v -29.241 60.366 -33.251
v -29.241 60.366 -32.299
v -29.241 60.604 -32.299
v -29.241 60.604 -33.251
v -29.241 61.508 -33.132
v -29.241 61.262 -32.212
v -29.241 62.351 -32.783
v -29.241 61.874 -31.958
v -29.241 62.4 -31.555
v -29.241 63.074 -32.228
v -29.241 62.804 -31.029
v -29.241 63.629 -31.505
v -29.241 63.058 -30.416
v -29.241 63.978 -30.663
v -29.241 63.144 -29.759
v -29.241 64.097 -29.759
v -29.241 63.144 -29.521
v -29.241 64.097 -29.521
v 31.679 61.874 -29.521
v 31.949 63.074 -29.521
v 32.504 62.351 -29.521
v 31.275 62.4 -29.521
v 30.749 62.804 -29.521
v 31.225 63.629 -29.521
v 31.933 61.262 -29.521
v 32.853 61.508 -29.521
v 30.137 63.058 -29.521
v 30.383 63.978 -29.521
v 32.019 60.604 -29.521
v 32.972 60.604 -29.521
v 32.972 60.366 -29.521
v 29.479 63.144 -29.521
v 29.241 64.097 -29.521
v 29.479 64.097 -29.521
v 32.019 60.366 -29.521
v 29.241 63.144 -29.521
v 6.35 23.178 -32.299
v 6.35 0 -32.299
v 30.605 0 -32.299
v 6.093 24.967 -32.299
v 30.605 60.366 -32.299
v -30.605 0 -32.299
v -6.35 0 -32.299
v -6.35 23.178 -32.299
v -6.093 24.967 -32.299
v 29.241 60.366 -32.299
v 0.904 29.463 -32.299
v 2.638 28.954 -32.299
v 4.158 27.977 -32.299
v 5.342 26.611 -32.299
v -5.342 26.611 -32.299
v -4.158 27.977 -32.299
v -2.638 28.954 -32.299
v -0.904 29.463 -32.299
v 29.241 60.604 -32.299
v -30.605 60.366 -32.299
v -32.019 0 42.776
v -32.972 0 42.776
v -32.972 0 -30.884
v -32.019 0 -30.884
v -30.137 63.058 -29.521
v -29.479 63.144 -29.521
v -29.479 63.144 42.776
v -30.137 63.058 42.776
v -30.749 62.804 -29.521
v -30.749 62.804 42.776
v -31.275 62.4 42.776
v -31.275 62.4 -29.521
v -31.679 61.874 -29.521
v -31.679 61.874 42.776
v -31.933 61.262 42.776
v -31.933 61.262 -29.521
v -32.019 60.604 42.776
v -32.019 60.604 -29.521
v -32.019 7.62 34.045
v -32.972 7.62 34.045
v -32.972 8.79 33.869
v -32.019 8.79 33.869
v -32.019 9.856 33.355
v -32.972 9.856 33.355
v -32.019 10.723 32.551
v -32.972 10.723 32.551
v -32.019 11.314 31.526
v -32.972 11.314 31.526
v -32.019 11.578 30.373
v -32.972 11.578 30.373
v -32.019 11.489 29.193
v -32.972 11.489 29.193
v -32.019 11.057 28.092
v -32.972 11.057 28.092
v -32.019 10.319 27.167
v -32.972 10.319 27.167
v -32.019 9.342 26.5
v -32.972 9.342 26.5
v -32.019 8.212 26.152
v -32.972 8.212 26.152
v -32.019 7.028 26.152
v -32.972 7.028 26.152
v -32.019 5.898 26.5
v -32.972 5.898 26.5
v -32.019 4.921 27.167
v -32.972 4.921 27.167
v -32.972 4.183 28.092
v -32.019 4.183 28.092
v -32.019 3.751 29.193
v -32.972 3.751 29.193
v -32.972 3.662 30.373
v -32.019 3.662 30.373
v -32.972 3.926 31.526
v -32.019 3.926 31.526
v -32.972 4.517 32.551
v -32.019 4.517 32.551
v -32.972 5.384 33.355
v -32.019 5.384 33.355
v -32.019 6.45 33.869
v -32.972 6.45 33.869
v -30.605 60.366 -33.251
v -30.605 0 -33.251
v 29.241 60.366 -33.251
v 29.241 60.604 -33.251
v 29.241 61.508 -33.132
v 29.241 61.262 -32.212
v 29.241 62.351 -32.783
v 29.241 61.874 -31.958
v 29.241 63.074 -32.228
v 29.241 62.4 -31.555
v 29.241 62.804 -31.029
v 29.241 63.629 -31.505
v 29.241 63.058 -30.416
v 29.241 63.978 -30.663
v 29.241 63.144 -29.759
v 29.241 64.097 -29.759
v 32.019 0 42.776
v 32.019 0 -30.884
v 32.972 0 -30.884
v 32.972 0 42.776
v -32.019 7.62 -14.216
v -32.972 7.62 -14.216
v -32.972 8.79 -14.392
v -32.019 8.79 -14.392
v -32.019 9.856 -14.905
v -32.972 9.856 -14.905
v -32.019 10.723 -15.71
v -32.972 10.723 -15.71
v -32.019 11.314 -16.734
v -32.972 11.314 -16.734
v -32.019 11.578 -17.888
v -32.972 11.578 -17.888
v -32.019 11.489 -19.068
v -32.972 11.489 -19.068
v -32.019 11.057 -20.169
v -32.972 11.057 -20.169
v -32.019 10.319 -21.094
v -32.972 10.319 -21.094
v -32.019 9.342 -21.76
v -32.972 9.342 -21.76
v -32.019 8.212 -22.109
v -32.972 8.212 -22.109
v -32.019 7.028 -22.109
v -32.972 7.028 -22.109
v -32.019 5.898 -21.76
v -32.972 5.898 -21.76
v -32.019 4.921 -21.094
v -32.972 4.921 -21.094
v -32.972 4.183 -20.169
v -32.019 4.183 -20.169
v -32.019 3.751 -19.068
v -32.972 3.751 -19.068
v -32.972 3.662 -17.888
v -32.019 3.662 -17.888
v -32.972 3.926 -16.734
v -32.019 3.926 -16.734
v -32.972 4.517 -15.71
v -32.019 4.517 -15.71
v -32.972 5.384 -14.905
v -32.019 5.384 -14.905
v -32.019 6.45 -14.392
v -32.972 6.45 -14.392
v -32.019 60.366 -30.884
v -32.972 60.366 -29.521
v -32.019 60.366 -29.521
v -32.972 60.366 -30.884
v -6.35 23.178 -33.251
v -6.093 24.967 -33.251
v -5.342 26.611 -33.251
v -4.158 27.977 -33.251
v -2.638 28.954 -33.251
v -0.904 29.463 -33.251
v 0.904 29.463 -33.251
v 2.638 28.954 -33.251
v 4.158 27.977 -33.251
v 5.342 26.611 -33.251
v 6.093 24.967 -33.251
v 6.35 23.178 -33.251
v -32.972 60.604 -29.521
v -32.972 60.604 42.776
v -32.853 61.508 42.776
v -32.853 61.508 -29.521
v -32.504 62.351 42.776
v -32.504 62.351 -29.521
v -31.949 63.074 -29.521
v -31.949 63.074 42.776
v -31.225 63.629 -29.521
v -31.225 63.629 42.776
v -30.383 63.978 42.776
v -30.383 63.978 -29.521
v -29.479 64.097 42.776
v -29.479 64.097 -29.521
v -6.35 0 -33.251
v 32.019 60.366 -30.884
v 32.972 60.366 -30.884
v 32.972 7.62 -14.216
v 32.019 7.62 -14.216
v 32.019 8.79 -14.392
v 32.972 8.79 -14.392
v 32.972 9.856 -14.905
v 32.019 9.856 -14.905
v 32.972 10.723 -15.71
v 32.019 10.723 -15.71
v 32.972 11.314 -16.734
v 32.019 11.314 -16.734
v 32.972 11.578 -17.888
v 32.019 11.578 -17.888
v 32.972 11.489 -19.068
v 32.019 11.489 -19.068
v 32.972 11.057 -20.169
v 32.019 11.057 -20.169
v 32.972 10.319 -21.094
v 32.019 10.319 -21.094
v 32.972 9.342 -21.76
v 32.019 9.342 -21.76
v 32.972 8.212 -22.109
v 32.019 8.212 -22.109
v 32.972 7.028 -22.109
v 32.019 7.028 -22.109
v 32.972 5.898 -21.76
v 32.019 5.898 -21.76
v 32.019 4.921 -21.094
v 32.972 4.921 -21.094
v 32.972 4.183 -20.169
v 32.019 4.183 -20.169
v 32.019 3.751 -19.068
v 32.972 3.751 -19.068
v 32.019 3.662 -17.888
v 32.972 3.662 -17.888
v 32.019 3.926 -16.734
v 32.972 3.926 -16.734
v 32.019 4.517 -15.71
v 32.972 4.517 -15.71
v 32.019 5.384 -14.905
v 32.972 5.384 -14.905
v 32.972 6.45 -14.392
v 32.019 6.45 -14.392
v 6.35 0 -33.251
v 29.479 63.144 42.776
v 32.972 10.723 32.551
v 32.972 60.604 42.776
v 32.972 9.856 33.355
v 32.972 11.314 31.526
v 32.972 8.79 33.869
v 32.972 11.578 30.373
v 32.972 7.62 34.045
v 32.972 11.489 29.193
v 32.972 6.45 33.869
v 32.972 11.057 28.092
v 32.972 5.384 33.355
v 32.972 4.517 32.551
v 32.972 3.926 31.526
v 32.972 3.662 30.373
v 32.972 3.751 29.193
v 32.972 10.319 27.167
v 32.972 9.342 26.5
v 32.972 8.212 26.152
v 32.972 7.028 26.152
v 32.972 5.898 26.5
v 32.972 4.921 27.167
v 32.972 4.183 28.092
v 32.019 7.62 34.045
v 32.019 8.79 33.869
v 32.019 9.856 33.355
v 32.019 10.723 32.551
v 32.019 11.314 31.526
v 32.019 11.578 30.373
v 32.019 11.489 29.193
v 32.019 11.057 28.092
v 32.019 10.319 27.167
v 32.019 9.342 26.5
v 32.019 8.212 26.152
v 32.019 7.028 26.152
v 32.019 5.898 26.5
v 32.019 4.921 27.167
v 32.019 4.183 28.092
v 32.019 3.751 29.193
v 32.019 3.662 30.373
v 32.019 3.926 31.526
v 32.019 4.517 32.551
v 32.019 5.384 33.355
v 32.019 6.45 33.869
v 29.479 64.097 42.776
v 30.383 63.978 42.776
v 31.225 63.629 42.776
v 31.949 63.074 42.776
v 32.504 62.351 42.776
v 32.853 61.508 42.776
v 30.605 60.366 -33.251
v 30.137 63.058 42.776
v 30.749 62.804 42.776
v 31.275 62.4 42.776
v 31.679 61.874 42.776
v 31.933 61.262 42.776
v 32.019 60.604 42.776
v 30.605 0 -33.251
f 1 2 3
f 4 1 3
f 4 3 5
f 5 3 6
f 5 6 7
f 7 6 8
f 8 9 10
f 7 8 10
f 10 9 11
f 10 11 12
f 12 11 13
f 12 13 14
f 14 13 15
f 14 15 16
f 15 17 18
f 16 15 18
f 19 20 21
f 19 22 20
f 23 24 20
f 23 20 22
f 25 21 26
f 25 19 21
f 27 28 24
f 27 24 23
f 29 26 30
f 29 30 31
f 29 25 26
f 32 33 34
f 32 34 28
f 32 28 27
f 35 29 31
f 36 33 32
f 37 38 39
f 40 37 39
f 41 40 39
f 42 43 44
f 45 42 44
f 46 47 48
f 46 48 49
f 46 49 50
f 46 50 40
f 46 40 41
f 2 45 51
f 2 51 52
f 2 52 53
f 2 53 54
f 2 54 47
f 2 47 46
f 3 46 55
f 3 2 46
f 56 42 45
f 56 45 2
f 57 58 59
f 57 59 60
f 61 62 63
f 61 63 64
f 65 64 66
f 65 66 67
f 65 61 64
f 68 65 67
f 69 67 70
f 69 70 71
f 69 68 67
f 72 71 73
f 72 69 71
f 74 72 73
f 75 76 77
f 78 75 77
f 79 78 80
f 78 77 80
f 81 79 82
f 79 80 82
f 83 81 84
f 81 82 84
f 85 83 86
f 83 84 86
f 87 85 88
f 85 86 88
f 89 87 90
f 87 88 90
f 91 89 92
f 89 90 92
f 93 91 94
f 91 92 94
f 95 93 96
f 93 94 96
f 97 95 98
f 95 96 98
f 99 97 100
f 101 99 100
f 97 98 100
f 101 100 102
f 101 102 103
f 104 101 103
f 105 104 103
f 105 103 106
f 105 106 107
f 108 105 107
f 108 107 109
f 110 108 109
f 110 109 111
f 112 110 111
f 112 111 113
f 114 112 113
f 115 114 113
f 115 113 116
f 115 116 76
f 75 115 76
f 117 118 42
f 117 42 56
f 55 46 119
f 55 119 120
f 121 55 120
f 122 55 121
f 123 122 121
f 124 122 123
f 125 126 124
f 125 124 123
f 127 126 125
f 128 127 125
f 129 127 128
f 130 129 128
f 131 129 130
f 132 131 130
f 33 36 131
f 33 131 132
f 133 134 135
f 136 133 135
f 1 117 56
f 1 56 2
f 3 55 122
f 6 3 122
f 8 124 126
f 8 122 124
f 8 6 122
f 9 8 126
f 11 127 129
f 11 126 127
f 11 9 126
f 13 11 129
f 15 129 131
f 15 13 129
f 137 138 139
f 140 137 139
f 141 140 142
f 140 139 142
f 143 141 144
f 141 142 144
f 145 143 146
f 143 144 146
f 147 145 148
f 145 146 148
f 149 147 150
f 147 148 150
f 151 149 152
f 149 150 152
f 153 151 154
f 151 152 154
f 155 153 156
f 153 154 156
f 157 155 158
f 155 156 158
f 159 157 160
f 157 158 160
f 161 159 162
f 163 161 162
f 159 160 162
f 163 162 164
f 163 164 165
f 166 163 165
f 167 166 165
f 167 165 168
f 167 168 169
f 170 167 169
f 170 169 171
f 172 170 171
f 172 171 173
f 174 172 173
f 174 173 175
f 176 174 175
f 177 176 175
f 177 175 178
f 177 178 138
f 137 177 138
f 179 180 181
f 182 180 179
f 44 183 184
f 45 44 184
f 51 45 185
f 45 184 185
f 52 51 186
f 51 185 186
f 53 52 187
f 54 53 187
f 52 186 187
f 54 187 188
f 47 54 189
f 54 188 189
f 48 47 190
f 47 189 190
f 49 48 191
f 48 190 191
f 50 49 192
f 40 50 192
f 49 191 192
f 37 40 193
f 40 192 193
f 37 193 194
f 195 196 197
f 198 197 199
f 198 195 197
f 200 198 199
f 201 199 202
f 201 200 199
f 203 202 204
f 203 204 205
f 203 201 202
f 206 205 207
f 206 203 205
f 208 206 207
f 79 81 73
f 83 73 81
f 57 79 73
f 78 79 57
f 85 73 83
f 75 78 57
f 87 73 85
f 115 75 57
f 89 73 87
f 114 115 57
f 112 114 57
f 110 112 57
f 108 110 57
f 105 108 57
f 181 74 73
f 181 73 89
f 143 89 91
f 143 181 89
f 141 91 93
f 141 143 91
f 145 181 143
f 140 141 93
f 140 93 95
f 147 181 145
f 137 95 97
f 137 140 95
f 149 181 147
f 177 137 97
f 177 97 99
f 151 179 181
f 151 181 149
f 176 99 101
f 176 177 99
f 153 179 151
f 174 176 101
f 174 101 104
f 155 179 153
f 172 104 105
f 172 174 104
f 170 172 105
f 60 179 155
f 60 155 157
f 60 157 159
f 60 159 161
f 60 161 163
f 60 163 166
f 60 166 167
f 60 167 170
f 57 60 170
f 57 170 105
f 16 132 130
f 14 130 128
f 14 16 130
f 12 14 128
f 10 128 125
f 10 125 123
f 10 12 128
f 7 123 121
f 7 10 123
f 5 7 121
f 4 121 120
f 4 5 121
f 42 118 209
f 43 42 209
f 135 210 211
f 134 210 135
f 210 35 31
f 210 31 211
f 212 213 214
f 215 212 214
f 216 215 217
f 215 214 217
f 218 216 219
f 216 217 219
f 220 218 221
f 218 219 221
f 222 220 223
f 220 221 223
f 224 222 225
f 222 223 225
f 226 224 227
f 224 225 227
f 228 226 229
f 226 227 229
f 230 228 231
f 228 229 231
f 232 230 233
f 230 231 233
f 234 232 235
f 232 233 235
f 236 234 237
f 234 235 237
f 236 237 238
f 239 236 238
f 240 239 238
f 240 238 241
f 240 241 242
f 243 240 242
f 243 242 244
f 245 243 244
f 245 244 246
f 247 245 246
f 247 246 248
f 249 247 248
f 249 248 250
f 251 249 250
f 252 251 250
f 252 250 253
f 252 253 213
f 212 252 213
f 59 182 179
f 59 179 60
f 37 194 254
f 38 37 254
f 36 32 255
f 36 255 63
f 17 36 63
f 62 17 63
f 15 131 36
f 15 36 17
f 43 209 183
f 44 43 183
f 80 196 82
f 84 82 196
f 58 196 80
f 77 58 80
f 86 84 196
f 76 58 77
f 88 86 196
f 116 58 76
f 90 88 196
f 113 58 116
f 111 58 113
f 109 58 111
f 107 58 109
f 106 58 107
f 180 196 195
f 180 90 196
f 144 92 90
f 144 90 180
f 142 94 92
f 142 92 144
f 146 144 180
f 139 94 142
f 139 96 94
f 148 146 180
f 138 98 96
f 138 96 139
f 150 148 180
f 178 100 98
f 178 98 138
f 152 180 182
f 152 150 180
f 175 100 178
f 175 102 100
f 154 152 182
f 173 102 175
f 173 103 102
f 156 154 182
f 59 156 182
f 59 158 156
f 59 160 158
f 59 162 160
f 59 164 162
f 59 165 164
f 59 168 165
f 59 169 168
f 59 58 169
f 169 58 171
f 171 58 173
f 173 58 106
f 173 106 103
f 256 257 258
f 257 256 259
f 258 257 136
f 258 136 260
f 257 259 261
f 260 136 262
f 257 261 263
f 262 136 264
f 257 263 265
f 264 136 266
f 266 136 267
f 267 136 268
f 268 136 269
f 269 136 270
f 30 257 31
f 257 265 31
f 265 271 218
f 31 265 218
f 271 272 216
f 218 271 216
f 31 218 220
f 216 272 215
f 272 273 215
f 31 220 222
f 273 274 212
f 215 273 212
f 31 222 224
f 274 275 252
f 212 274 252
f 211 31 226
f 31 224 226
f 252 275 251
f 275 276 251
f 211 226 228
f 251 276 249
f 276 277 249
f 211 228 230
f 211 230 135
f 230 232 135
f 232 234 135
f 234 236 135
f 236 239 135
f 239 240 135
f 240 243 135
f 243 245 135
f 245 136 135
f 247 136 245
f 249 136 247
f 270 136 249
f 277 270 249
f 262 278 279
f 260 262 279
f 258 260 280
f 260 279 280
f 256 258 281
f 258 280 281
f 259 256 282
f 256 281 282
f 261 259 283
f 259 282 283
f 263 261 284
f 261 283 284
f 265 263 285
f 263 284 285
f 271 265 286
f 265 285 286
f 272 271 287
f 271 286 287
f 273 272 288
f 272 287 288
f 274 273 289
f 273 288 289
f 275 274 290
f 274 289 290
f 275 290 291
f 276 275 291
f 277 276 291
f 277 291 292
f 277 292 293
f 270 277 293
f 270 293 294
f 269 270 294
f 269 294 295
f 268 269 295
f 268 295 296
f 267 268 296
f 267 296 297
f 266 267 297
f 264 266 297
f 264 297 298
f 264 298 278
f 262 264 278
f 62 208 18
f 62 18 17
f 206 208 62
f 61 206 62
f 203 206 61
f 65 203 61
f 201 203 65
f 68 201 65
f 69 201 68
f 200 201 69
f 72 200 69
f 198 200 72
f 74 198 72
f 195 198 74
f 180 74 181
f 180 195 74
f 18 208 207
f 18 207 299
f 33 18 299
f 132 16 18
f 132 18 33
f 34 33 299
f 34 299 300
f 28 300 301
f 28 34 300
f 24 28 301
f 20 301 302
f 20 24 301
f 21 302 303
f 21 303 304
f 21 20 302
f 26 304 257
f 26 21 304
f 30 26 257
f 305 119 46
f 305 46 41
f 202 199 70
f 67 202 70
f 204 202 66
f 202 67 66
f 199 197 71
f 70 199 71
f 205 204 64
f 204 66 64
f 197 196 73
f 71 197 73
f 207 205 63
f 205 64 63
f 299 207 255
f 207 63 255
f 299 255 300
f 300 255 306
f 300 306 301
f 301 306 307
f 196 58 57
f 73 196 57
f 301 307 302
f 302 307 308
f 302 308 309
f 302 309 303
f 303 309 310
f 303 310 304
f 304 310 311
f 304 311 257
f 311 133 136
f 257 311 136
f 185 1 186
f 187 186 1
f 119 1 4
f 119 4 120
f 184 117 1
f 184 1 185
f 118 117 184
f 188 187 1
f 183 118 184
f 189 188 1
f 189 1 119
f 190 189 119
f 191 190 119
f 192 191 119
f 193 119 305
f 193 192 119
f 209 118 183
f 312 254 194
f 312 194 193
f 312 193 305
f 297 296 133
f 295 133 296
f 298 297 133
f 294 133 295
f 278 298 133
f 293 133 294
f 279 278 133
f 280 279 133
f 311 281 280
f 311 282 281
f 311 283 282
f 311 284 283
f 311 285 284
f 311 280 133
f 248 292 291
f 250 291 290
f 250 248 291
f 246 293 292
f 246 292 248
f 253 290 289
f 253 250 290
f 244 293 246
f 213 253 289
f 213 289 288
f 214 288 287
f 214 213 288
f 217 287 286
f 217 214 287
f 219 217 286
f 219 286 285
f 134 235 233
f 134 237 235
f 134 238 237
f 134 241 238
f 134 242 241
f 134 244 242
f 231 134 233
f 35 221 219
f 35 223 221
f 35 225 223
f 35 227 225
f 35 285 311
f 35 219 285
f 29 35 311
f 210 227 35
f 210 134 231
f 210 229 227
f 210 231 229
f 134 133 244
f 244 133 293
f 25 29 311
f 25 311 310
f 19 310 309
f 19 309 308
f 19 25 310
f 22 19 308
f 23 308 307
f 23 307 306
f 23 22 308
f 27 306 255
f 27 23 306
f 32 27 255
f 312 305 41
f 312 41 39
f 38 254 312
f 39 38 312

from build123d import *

# Parameters (mm, degrees)
SKETCH1_W              = 65.94348
SKETCH1_H              = 76.02728
BOSS_EXTRUDE1_DEPTH    = 64.0969
CONVERT_SOLID1_START   = -29.75864
CONVERT_SOLID1_DEPTH   = 72.53478
CONVERT_SOLID1_START_2 = -34
CONVERT_SOLID1_2_DEPTH = 4.479485
CONVERT_SOLID1_START_3 = -32.01924
CONVERT_SOLID1_3_DEPTH = 64.03848
CONVERT_SOLID1_4_DEPTH = 1.98076
CONVERT_SOLID1_START_4 = 32.01924
CONVERT_SOLID1_5_DEPTH = 1.98076
CONVERT_SOLID1_START_5 = -32.97174
CONVERT_SOLID1_6_DEPTH = 3.730625
CONVERT_SOLID1_START_6 = 29.241115
CONVERT_SOLID1_7_DEPTH = 3.730625
CONVERT_SOLID1_START_7 = -29.520515
CONVERT_SOLID1_8_DEPTH = 73.520515
CUT_EXTRUDE4_REACH     = 106.765
SKETCH12_R             = 3.96875
CUT_EXTRUDE5_DEPTH     = 102.423632835


with BuildPart() as part:
    # Sketch1 → Boss-Extrude1 (new body)
    with BuildSketch(Plane(origin=(0, 0, 0), x_dir=(1, 0, 0), z_dir=(0, 1, 0))):
        with Locations((0, -4.7625)):
            Rectangle(SKETCH1_W, SKETCH1_H)
    extrude(amount=BOSS_EXTRUDE1_DEPTH)

    # Convert-Solid1: read off the stored shape, not the designer's step
    # Convert-Solid1 outline → Convert-Solid1 (cut)
    with BuildSketch(Plane.XY.offset(CONVERT_SOLID1_START)):
        with BuildLine():
            Line((-32.01924, 0), (32.01924, 0))
            Line((32.01924, 0), (32.01924, 60.6044))
            ThreePointArc((32.01924, 60.6044), (31.275291224, 62.400451224), (29.47924, 63.1444))
            Line((29.47924, 63.1444), (-29.47924, 63.1444))
            ThreePointArc((-29.47924, 63.1444), (-31.275291224, 62.400451224), (-32.01924, 60.6044))
            Line((-32.01924, 60.6044), (-32.01924, 0))
        make_face()
    extrude(amount=CONVERT_SOLID1_DEPTH, mode=Mode.SUBTRACT)

    # Convert-Solid1 2 outline → Convert-Solid1 2 (cut)
    with BuildSketch(Plane.XY.offset(CONVERT_SOLID1_START_2)):
        with BuildLine():
            Line((-30.605026438, 60.366275), (-29.241115, 60.366275))
            Line((-29.241115, 60.366275), (-29.241115, 63.1444))
            Line((-29.241115, 63.1444), (-29.47924, 63.1444))
            ThreePointArc((-29.47924, 63.1444), (-31.275291224, 62.400451224), (-32.01924, 60.6044))
            Line((-32.01924, 60.6044), (-32.01924, 0))
            Line((-32.01924, 0), (-30.605026438, 0))
            Line((-30.605026438, 0), (-30.605026438, 60.366275))
        make_face()
        with BuildLine():
            Line((29.47924, 63.1444), (29.241115, 63.1444))
            Line((29.241115, 63.1444), (29.241115, 60.366275))
            Line((29.241115, 60.366275), (30.605026438, 60.366275))
            Line((30.605026438, 60.366275), (30.605026438, 0))
            Line((30.605026438, 0), (32.01924, 0))
            Line((32.01924, 0), (32.01924, 60.6044))
            ThreePointArc((32.01924, 60.6044), (31.275291224, 62.400451224), (29.47924, 63.1444))
        make_face()
    extrude(amount=CONVERT_SOLID1_2_DEPTH, mode=Mode.SUBTRACT)

    # Convert-Solid1 3 outline → Convert-Solid1 3 (cut)
    with BuildSketch(Plane.YZ.offset(CONVERT_SOLID1_START_3)):
        with BuildLine():
            Line((63.1444, -29.75864), (63.1444, -29.520515))
            Line((63.1444, -29.520515), (60.366275, -29.520515))
            Line((60.366275, -29.520515), (60.366275, -29.75864))
            Line((60.366275, -29.75864), (0, -29.75864))
            Line((0, -29.75864), (0, -32.29864))
            Line((0, -32.29864), (60.6044, -32.29864))
            ThreePointArc((60.6044, -32.29864), (62.400451224, -31.554691224), (63.1444, -29.75864))
        make_face()
        with BuildLine():
            Line((64.0969, -33.25114), (64.0969, -29.75864))
            ThreePointArc((64.0969, -29.75864), (63.073970433, -32.228210433), (60.6044, -33.25114))
            Line((60.6044, -33.25114), (64.0969, -33.25114))
        make_face()
    extrude(amount=CONVERT_SOLID1_3_DEPTH, mode=Mode.SUBTRACT)

    # Convert-Solid1 4 outline → Convert-Solid1 4 (cut)
    with BuildSketch(Plane.YZ.offset(CONVERT_SOLID1_START_2)):
        Polygon((64.0969, 42.77614), (63.1444, 42.77614), (63.1444, -29.520515), (60.366275, -29.520515), (60.366275, -30.884426438), (0, -30.884426438), (0, -33.25114), (64.0969, -33.25114), align=None)
    extrude(amount=CONVERT_SOLID1_4_DEPTH, mode=Mode.SUBTRACT)

    # Convert-Solid1 5 outline → Convert-Solid1 5 (cut)
    with BuildSketch(Plane.YZ.offset(CONVERT_SOLID1_START_4)):
        Polygon((64.0969, 42.77614), (63.1444, 42.77614), (63.1444, -29.520515), (60.366275, -29.520515), (60.366275, -30.884426438), (0, -30.884426438), (0, -33.25114), (64.0969, -33.25114), align=None)
    extrude(amount=CONVERT_SOLID1_5_DEPTH, mode=Mode.SUBTRACT)

    # Convert-Solid1 6 outline → Convert-Solid1 6 (cut)
    with BuildSketch(Plane.YZ.offset(CONVERT_SOLID1_START_5)):
        with BuildLine():
            Line((64.0969, -29.75864), (64.0969, -29.520515))
            Line((64.0969, -29.520515), (63.1444, -29.520515))
            Line((63.1444, -29.520515), (63.1444, -29.75864))
            ThreePointArc((63.1444, -29.75864), (62.400451224, -31.554691224), (60.6044, -32.29864))
            Line((60.6044, -32.29864), (60.366275, -32.29864))
            Line((60.366275, -32.29864), (60.366275, -33.25114))
            Line((60.366275, -33.25114), (60.6044, -33.25114))
            ThreePointArc((60.6044, -33.25114), (63.073970433, -32.228210433), (64.0969, -29.75864))
        make_face()
    extrude(amount=CONVERT_SOLID1_6_DEPTH, mode=Mode.SUBTRACT)

    # Convert-Solid1 7 outline → Convert-Solid1 7 (cut)
    with BuildSketch(Plane.YZ.offset(CONVERT_SOLID1_START_6)):
        with BuildLine():
            Line((64.0969, -29.75864), (64.0969, -29.520515))
            Line((64.0969, -29.520515), (63.1444, -29.520515))
            Line((63.1444, -29.520515), (63.1444, -29.75864))
            ThreePointArc((63.1444, -29.75864), (62.400451224, -31.554691224), (60.6044, -32.29864))
            Line((60.6044, -32.29864), (60.366275, -32.29864))
            Line((60.366275, -32.29864), (60.366275, -33.25114))
            Line((60.366275, -33.25114), (60.6044, -33.25114))
            ThreePointArc((60.6044, -33.25114), (63.073970433, -32.228210433), (64.0969, -29.75864))
        make_face()
    extrude(amount=CONVERT_SOLID1_7_DEPTH, mode=Mode.SUBTRACT)

    # Convert-Solid1 8 outline → Convert-Solid1 8 (cut)
    with BuildSketch(Plane.XY.offset(CONVERT_SOLID1_START_7)):
        with BuildLine():
            Line((32.01924, 64.0969), (29.47924, 64.0969))
            ThreePointArc((29.47924, 64.0969), (31.948810433, 63.073970433), (32.97174, 60.6044))
            Line((32.97174, 60.6044), (32.97174, 63.1444))
            Line((32.97174, 63.1444), (32.01924, 63.1444))
            Line((32.01924, 63.1444), (32.01924, 64.0969))
        make_face()
        with BuildLine():
            ThreePointArc((-32.97174, 60.6044), (-31.948810433, 63.073970433), (-29.47924, 64.0969))
            Line((-29.47924, 64.0969), (-32.01924, 64.0969))
            Line((-32.01924, 64.0969), (-32.01924, 63.1444))
            Line((-32.01924, 63.1444), (-32.97174, 63.1444))
            Line((-32.97174, 63.1444), (-32.97174, 60.6044))
        make_face()
    extrude(amount=CONVERT_SOLID1_8_DEPTH, mode=Mode.SUBTRACT)

    # Sketch7 → Cut-Extrude4 (cut, up to next)
    with BuildSketch(Plane(origin=(0, 0, -33.25114), x_dir=(-1, 0, 0), z_dir=(0, 0, -1)), mode=Mode.PRIVATE) as cut_extrude4_sk1:
        with BuildLine():
            Line((-6.35, 23.1775), (-6.35, 0))
            Line((-6.35, 0), (6.35, 0))
            Line((6.35, 0), (6.35, 23.1775))
            ThreePointArc((6.35, 23.1775), (0, 29.5275), (-6.35, 23.1775))
        make_face()
    cut_extrude4_tool1 = extrude(cut_extrude4_sk1.sketch, amount=-CUT_EXTRUDE4_REACH, mode=Mode.PRIVATE) & part.part
    add(cut_extrude4_tool1.solids().sort_by_distance((0, 14.118049, -33.25114))[0], mode=Mode.SUBTRACT)

    # Sketch12 → Cut-Extrude5 (cut, through all)
    with BuildSketch(Plane.ZY.offset(32.97174)):
        with Locations((-18.184426438, 7.62)):
            Circle(SKETCH12_R)
        with Locations((30.07614, 7.62)):
            Circle(SKETCH12_R)
    extrude(amount=-CUT_EXTRUDE5_DEPTH, mode=Mode.SUBTRACT)


solid = part.part
